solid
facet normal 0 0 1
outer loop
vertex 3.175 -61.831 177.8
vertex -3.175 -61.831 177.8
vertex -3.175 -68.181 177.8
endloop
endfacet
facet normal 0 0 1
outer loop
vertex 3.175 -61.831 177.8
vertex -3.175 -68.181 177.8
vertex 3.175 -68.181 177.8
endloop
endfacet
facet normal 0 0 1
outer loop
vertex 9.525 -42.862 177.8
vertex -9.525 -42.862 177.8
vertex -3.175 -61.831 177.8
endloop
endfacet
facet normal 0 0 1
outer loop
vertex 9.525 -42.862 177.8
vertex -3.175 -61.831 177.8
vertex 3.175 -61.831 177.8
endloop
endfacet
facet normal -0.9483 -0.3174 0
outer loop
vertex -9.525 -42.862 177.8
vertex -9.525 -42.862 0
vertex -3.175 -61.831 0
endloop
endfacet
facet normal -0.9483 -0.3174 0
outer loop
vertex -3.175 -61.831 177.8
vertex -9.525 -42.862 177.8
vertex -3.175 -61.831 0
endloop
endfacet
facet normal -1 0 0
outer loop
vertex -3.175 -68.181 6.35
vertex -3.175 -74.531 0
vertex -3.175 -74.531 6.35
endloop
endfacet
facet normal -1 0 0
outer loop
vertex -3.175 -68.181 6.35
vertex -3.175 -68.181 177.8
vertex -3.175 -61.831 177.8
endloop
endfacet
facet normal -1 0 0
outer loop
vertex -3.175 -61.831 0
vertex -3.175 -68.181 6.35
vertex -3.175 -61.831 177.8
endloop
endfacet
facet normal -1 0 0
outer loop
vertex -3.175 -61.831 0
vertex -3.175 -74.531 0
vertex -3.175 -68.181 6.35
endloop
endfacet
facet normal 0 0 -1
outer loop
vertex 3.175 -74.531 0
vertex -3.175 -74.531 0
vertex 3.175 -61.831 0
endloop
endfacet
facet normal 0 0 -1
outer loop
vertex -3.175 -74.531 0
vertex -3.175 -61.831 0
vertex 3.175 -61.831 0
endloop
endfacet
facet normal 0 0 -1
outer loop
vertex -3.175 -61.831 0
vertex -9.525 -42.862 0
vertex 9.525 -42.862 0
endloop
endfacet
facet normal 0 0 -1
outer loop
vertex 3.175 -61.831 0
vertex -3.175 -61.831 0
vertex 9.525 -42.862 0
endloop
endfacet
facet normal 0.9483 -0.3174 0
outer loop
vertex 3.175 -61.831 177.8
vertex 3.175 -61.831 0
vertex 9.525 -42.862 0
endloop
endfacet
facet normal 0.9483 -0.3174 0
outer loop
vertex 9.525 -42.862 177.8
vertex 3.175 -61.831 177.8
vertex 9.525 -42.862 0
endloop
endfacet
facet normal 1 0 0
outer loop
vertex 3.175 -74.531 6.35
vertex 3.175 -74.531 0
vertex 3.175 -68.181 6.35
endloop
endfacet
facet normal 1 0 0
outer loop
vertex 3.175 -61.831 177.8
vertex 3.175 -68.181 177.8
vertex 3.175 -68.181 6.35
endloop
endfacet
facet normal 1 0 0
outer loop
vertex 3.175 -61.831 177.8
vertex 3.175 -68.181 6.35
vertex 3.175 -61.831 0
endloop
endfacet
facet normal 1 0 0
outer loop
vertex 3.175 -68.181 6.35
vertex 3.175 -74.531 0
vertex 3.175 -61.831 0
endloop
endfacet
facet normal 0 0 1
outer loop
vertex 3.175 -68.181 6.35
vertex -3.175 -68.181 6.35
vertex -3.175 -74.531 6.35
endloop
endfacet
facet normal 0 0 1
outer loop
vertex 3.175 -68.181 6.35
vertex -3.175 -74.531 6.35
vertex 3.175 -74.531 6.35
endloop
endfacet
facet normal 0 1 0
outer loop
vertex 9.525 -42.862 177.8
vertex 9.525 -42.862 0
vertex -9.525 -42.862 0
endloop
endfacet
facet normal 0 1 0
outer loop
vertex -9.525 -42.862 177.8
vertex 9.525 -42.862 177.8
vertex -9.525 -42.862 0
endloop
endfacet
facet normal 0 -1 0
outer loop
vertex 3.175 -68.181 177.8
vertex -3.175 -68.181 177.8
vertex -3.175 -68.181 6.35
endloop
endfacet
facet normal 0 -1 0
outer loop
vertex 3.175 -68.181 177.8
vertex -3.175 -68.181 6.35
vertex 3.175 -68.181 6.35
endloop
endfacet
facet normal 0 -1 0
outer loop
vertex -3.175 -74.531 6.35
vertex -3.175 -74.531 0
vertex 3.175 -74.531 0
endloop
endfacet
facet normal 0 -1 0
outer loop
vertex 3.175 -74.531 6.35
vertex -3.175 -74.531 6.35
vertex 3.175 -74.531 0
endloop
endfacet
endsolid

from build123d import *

# Parameters (mm, degrees)
F0_W     = 6.35
F0_H     = 6.35
F1_DEPTH = 177.8
F2_DEPTH = 6.35


with BuildPart() as f1:
    # F0 (on Top) → F1 (new body)
    with BuildSketch(Plane.XY):
        Polygon((9.525, -42.8625), (-9.525, -42.8625), (-3.175, -61.831036), (3.175, -61.831036), align=None)
        with Locations((0, -65.006036)):
            Rectangle(F0_W, F0_H)
    extrude(amount=F1_DEPTH)

    # F0 (on Top) → F2 (join)
    with BuildSketch(Plane.XY):
        with Locations((0, -71.356036)):
            Rectangle(F0_W, F0_H)
    extrude(amount=F2_DEPTH)


solid = f1.part
